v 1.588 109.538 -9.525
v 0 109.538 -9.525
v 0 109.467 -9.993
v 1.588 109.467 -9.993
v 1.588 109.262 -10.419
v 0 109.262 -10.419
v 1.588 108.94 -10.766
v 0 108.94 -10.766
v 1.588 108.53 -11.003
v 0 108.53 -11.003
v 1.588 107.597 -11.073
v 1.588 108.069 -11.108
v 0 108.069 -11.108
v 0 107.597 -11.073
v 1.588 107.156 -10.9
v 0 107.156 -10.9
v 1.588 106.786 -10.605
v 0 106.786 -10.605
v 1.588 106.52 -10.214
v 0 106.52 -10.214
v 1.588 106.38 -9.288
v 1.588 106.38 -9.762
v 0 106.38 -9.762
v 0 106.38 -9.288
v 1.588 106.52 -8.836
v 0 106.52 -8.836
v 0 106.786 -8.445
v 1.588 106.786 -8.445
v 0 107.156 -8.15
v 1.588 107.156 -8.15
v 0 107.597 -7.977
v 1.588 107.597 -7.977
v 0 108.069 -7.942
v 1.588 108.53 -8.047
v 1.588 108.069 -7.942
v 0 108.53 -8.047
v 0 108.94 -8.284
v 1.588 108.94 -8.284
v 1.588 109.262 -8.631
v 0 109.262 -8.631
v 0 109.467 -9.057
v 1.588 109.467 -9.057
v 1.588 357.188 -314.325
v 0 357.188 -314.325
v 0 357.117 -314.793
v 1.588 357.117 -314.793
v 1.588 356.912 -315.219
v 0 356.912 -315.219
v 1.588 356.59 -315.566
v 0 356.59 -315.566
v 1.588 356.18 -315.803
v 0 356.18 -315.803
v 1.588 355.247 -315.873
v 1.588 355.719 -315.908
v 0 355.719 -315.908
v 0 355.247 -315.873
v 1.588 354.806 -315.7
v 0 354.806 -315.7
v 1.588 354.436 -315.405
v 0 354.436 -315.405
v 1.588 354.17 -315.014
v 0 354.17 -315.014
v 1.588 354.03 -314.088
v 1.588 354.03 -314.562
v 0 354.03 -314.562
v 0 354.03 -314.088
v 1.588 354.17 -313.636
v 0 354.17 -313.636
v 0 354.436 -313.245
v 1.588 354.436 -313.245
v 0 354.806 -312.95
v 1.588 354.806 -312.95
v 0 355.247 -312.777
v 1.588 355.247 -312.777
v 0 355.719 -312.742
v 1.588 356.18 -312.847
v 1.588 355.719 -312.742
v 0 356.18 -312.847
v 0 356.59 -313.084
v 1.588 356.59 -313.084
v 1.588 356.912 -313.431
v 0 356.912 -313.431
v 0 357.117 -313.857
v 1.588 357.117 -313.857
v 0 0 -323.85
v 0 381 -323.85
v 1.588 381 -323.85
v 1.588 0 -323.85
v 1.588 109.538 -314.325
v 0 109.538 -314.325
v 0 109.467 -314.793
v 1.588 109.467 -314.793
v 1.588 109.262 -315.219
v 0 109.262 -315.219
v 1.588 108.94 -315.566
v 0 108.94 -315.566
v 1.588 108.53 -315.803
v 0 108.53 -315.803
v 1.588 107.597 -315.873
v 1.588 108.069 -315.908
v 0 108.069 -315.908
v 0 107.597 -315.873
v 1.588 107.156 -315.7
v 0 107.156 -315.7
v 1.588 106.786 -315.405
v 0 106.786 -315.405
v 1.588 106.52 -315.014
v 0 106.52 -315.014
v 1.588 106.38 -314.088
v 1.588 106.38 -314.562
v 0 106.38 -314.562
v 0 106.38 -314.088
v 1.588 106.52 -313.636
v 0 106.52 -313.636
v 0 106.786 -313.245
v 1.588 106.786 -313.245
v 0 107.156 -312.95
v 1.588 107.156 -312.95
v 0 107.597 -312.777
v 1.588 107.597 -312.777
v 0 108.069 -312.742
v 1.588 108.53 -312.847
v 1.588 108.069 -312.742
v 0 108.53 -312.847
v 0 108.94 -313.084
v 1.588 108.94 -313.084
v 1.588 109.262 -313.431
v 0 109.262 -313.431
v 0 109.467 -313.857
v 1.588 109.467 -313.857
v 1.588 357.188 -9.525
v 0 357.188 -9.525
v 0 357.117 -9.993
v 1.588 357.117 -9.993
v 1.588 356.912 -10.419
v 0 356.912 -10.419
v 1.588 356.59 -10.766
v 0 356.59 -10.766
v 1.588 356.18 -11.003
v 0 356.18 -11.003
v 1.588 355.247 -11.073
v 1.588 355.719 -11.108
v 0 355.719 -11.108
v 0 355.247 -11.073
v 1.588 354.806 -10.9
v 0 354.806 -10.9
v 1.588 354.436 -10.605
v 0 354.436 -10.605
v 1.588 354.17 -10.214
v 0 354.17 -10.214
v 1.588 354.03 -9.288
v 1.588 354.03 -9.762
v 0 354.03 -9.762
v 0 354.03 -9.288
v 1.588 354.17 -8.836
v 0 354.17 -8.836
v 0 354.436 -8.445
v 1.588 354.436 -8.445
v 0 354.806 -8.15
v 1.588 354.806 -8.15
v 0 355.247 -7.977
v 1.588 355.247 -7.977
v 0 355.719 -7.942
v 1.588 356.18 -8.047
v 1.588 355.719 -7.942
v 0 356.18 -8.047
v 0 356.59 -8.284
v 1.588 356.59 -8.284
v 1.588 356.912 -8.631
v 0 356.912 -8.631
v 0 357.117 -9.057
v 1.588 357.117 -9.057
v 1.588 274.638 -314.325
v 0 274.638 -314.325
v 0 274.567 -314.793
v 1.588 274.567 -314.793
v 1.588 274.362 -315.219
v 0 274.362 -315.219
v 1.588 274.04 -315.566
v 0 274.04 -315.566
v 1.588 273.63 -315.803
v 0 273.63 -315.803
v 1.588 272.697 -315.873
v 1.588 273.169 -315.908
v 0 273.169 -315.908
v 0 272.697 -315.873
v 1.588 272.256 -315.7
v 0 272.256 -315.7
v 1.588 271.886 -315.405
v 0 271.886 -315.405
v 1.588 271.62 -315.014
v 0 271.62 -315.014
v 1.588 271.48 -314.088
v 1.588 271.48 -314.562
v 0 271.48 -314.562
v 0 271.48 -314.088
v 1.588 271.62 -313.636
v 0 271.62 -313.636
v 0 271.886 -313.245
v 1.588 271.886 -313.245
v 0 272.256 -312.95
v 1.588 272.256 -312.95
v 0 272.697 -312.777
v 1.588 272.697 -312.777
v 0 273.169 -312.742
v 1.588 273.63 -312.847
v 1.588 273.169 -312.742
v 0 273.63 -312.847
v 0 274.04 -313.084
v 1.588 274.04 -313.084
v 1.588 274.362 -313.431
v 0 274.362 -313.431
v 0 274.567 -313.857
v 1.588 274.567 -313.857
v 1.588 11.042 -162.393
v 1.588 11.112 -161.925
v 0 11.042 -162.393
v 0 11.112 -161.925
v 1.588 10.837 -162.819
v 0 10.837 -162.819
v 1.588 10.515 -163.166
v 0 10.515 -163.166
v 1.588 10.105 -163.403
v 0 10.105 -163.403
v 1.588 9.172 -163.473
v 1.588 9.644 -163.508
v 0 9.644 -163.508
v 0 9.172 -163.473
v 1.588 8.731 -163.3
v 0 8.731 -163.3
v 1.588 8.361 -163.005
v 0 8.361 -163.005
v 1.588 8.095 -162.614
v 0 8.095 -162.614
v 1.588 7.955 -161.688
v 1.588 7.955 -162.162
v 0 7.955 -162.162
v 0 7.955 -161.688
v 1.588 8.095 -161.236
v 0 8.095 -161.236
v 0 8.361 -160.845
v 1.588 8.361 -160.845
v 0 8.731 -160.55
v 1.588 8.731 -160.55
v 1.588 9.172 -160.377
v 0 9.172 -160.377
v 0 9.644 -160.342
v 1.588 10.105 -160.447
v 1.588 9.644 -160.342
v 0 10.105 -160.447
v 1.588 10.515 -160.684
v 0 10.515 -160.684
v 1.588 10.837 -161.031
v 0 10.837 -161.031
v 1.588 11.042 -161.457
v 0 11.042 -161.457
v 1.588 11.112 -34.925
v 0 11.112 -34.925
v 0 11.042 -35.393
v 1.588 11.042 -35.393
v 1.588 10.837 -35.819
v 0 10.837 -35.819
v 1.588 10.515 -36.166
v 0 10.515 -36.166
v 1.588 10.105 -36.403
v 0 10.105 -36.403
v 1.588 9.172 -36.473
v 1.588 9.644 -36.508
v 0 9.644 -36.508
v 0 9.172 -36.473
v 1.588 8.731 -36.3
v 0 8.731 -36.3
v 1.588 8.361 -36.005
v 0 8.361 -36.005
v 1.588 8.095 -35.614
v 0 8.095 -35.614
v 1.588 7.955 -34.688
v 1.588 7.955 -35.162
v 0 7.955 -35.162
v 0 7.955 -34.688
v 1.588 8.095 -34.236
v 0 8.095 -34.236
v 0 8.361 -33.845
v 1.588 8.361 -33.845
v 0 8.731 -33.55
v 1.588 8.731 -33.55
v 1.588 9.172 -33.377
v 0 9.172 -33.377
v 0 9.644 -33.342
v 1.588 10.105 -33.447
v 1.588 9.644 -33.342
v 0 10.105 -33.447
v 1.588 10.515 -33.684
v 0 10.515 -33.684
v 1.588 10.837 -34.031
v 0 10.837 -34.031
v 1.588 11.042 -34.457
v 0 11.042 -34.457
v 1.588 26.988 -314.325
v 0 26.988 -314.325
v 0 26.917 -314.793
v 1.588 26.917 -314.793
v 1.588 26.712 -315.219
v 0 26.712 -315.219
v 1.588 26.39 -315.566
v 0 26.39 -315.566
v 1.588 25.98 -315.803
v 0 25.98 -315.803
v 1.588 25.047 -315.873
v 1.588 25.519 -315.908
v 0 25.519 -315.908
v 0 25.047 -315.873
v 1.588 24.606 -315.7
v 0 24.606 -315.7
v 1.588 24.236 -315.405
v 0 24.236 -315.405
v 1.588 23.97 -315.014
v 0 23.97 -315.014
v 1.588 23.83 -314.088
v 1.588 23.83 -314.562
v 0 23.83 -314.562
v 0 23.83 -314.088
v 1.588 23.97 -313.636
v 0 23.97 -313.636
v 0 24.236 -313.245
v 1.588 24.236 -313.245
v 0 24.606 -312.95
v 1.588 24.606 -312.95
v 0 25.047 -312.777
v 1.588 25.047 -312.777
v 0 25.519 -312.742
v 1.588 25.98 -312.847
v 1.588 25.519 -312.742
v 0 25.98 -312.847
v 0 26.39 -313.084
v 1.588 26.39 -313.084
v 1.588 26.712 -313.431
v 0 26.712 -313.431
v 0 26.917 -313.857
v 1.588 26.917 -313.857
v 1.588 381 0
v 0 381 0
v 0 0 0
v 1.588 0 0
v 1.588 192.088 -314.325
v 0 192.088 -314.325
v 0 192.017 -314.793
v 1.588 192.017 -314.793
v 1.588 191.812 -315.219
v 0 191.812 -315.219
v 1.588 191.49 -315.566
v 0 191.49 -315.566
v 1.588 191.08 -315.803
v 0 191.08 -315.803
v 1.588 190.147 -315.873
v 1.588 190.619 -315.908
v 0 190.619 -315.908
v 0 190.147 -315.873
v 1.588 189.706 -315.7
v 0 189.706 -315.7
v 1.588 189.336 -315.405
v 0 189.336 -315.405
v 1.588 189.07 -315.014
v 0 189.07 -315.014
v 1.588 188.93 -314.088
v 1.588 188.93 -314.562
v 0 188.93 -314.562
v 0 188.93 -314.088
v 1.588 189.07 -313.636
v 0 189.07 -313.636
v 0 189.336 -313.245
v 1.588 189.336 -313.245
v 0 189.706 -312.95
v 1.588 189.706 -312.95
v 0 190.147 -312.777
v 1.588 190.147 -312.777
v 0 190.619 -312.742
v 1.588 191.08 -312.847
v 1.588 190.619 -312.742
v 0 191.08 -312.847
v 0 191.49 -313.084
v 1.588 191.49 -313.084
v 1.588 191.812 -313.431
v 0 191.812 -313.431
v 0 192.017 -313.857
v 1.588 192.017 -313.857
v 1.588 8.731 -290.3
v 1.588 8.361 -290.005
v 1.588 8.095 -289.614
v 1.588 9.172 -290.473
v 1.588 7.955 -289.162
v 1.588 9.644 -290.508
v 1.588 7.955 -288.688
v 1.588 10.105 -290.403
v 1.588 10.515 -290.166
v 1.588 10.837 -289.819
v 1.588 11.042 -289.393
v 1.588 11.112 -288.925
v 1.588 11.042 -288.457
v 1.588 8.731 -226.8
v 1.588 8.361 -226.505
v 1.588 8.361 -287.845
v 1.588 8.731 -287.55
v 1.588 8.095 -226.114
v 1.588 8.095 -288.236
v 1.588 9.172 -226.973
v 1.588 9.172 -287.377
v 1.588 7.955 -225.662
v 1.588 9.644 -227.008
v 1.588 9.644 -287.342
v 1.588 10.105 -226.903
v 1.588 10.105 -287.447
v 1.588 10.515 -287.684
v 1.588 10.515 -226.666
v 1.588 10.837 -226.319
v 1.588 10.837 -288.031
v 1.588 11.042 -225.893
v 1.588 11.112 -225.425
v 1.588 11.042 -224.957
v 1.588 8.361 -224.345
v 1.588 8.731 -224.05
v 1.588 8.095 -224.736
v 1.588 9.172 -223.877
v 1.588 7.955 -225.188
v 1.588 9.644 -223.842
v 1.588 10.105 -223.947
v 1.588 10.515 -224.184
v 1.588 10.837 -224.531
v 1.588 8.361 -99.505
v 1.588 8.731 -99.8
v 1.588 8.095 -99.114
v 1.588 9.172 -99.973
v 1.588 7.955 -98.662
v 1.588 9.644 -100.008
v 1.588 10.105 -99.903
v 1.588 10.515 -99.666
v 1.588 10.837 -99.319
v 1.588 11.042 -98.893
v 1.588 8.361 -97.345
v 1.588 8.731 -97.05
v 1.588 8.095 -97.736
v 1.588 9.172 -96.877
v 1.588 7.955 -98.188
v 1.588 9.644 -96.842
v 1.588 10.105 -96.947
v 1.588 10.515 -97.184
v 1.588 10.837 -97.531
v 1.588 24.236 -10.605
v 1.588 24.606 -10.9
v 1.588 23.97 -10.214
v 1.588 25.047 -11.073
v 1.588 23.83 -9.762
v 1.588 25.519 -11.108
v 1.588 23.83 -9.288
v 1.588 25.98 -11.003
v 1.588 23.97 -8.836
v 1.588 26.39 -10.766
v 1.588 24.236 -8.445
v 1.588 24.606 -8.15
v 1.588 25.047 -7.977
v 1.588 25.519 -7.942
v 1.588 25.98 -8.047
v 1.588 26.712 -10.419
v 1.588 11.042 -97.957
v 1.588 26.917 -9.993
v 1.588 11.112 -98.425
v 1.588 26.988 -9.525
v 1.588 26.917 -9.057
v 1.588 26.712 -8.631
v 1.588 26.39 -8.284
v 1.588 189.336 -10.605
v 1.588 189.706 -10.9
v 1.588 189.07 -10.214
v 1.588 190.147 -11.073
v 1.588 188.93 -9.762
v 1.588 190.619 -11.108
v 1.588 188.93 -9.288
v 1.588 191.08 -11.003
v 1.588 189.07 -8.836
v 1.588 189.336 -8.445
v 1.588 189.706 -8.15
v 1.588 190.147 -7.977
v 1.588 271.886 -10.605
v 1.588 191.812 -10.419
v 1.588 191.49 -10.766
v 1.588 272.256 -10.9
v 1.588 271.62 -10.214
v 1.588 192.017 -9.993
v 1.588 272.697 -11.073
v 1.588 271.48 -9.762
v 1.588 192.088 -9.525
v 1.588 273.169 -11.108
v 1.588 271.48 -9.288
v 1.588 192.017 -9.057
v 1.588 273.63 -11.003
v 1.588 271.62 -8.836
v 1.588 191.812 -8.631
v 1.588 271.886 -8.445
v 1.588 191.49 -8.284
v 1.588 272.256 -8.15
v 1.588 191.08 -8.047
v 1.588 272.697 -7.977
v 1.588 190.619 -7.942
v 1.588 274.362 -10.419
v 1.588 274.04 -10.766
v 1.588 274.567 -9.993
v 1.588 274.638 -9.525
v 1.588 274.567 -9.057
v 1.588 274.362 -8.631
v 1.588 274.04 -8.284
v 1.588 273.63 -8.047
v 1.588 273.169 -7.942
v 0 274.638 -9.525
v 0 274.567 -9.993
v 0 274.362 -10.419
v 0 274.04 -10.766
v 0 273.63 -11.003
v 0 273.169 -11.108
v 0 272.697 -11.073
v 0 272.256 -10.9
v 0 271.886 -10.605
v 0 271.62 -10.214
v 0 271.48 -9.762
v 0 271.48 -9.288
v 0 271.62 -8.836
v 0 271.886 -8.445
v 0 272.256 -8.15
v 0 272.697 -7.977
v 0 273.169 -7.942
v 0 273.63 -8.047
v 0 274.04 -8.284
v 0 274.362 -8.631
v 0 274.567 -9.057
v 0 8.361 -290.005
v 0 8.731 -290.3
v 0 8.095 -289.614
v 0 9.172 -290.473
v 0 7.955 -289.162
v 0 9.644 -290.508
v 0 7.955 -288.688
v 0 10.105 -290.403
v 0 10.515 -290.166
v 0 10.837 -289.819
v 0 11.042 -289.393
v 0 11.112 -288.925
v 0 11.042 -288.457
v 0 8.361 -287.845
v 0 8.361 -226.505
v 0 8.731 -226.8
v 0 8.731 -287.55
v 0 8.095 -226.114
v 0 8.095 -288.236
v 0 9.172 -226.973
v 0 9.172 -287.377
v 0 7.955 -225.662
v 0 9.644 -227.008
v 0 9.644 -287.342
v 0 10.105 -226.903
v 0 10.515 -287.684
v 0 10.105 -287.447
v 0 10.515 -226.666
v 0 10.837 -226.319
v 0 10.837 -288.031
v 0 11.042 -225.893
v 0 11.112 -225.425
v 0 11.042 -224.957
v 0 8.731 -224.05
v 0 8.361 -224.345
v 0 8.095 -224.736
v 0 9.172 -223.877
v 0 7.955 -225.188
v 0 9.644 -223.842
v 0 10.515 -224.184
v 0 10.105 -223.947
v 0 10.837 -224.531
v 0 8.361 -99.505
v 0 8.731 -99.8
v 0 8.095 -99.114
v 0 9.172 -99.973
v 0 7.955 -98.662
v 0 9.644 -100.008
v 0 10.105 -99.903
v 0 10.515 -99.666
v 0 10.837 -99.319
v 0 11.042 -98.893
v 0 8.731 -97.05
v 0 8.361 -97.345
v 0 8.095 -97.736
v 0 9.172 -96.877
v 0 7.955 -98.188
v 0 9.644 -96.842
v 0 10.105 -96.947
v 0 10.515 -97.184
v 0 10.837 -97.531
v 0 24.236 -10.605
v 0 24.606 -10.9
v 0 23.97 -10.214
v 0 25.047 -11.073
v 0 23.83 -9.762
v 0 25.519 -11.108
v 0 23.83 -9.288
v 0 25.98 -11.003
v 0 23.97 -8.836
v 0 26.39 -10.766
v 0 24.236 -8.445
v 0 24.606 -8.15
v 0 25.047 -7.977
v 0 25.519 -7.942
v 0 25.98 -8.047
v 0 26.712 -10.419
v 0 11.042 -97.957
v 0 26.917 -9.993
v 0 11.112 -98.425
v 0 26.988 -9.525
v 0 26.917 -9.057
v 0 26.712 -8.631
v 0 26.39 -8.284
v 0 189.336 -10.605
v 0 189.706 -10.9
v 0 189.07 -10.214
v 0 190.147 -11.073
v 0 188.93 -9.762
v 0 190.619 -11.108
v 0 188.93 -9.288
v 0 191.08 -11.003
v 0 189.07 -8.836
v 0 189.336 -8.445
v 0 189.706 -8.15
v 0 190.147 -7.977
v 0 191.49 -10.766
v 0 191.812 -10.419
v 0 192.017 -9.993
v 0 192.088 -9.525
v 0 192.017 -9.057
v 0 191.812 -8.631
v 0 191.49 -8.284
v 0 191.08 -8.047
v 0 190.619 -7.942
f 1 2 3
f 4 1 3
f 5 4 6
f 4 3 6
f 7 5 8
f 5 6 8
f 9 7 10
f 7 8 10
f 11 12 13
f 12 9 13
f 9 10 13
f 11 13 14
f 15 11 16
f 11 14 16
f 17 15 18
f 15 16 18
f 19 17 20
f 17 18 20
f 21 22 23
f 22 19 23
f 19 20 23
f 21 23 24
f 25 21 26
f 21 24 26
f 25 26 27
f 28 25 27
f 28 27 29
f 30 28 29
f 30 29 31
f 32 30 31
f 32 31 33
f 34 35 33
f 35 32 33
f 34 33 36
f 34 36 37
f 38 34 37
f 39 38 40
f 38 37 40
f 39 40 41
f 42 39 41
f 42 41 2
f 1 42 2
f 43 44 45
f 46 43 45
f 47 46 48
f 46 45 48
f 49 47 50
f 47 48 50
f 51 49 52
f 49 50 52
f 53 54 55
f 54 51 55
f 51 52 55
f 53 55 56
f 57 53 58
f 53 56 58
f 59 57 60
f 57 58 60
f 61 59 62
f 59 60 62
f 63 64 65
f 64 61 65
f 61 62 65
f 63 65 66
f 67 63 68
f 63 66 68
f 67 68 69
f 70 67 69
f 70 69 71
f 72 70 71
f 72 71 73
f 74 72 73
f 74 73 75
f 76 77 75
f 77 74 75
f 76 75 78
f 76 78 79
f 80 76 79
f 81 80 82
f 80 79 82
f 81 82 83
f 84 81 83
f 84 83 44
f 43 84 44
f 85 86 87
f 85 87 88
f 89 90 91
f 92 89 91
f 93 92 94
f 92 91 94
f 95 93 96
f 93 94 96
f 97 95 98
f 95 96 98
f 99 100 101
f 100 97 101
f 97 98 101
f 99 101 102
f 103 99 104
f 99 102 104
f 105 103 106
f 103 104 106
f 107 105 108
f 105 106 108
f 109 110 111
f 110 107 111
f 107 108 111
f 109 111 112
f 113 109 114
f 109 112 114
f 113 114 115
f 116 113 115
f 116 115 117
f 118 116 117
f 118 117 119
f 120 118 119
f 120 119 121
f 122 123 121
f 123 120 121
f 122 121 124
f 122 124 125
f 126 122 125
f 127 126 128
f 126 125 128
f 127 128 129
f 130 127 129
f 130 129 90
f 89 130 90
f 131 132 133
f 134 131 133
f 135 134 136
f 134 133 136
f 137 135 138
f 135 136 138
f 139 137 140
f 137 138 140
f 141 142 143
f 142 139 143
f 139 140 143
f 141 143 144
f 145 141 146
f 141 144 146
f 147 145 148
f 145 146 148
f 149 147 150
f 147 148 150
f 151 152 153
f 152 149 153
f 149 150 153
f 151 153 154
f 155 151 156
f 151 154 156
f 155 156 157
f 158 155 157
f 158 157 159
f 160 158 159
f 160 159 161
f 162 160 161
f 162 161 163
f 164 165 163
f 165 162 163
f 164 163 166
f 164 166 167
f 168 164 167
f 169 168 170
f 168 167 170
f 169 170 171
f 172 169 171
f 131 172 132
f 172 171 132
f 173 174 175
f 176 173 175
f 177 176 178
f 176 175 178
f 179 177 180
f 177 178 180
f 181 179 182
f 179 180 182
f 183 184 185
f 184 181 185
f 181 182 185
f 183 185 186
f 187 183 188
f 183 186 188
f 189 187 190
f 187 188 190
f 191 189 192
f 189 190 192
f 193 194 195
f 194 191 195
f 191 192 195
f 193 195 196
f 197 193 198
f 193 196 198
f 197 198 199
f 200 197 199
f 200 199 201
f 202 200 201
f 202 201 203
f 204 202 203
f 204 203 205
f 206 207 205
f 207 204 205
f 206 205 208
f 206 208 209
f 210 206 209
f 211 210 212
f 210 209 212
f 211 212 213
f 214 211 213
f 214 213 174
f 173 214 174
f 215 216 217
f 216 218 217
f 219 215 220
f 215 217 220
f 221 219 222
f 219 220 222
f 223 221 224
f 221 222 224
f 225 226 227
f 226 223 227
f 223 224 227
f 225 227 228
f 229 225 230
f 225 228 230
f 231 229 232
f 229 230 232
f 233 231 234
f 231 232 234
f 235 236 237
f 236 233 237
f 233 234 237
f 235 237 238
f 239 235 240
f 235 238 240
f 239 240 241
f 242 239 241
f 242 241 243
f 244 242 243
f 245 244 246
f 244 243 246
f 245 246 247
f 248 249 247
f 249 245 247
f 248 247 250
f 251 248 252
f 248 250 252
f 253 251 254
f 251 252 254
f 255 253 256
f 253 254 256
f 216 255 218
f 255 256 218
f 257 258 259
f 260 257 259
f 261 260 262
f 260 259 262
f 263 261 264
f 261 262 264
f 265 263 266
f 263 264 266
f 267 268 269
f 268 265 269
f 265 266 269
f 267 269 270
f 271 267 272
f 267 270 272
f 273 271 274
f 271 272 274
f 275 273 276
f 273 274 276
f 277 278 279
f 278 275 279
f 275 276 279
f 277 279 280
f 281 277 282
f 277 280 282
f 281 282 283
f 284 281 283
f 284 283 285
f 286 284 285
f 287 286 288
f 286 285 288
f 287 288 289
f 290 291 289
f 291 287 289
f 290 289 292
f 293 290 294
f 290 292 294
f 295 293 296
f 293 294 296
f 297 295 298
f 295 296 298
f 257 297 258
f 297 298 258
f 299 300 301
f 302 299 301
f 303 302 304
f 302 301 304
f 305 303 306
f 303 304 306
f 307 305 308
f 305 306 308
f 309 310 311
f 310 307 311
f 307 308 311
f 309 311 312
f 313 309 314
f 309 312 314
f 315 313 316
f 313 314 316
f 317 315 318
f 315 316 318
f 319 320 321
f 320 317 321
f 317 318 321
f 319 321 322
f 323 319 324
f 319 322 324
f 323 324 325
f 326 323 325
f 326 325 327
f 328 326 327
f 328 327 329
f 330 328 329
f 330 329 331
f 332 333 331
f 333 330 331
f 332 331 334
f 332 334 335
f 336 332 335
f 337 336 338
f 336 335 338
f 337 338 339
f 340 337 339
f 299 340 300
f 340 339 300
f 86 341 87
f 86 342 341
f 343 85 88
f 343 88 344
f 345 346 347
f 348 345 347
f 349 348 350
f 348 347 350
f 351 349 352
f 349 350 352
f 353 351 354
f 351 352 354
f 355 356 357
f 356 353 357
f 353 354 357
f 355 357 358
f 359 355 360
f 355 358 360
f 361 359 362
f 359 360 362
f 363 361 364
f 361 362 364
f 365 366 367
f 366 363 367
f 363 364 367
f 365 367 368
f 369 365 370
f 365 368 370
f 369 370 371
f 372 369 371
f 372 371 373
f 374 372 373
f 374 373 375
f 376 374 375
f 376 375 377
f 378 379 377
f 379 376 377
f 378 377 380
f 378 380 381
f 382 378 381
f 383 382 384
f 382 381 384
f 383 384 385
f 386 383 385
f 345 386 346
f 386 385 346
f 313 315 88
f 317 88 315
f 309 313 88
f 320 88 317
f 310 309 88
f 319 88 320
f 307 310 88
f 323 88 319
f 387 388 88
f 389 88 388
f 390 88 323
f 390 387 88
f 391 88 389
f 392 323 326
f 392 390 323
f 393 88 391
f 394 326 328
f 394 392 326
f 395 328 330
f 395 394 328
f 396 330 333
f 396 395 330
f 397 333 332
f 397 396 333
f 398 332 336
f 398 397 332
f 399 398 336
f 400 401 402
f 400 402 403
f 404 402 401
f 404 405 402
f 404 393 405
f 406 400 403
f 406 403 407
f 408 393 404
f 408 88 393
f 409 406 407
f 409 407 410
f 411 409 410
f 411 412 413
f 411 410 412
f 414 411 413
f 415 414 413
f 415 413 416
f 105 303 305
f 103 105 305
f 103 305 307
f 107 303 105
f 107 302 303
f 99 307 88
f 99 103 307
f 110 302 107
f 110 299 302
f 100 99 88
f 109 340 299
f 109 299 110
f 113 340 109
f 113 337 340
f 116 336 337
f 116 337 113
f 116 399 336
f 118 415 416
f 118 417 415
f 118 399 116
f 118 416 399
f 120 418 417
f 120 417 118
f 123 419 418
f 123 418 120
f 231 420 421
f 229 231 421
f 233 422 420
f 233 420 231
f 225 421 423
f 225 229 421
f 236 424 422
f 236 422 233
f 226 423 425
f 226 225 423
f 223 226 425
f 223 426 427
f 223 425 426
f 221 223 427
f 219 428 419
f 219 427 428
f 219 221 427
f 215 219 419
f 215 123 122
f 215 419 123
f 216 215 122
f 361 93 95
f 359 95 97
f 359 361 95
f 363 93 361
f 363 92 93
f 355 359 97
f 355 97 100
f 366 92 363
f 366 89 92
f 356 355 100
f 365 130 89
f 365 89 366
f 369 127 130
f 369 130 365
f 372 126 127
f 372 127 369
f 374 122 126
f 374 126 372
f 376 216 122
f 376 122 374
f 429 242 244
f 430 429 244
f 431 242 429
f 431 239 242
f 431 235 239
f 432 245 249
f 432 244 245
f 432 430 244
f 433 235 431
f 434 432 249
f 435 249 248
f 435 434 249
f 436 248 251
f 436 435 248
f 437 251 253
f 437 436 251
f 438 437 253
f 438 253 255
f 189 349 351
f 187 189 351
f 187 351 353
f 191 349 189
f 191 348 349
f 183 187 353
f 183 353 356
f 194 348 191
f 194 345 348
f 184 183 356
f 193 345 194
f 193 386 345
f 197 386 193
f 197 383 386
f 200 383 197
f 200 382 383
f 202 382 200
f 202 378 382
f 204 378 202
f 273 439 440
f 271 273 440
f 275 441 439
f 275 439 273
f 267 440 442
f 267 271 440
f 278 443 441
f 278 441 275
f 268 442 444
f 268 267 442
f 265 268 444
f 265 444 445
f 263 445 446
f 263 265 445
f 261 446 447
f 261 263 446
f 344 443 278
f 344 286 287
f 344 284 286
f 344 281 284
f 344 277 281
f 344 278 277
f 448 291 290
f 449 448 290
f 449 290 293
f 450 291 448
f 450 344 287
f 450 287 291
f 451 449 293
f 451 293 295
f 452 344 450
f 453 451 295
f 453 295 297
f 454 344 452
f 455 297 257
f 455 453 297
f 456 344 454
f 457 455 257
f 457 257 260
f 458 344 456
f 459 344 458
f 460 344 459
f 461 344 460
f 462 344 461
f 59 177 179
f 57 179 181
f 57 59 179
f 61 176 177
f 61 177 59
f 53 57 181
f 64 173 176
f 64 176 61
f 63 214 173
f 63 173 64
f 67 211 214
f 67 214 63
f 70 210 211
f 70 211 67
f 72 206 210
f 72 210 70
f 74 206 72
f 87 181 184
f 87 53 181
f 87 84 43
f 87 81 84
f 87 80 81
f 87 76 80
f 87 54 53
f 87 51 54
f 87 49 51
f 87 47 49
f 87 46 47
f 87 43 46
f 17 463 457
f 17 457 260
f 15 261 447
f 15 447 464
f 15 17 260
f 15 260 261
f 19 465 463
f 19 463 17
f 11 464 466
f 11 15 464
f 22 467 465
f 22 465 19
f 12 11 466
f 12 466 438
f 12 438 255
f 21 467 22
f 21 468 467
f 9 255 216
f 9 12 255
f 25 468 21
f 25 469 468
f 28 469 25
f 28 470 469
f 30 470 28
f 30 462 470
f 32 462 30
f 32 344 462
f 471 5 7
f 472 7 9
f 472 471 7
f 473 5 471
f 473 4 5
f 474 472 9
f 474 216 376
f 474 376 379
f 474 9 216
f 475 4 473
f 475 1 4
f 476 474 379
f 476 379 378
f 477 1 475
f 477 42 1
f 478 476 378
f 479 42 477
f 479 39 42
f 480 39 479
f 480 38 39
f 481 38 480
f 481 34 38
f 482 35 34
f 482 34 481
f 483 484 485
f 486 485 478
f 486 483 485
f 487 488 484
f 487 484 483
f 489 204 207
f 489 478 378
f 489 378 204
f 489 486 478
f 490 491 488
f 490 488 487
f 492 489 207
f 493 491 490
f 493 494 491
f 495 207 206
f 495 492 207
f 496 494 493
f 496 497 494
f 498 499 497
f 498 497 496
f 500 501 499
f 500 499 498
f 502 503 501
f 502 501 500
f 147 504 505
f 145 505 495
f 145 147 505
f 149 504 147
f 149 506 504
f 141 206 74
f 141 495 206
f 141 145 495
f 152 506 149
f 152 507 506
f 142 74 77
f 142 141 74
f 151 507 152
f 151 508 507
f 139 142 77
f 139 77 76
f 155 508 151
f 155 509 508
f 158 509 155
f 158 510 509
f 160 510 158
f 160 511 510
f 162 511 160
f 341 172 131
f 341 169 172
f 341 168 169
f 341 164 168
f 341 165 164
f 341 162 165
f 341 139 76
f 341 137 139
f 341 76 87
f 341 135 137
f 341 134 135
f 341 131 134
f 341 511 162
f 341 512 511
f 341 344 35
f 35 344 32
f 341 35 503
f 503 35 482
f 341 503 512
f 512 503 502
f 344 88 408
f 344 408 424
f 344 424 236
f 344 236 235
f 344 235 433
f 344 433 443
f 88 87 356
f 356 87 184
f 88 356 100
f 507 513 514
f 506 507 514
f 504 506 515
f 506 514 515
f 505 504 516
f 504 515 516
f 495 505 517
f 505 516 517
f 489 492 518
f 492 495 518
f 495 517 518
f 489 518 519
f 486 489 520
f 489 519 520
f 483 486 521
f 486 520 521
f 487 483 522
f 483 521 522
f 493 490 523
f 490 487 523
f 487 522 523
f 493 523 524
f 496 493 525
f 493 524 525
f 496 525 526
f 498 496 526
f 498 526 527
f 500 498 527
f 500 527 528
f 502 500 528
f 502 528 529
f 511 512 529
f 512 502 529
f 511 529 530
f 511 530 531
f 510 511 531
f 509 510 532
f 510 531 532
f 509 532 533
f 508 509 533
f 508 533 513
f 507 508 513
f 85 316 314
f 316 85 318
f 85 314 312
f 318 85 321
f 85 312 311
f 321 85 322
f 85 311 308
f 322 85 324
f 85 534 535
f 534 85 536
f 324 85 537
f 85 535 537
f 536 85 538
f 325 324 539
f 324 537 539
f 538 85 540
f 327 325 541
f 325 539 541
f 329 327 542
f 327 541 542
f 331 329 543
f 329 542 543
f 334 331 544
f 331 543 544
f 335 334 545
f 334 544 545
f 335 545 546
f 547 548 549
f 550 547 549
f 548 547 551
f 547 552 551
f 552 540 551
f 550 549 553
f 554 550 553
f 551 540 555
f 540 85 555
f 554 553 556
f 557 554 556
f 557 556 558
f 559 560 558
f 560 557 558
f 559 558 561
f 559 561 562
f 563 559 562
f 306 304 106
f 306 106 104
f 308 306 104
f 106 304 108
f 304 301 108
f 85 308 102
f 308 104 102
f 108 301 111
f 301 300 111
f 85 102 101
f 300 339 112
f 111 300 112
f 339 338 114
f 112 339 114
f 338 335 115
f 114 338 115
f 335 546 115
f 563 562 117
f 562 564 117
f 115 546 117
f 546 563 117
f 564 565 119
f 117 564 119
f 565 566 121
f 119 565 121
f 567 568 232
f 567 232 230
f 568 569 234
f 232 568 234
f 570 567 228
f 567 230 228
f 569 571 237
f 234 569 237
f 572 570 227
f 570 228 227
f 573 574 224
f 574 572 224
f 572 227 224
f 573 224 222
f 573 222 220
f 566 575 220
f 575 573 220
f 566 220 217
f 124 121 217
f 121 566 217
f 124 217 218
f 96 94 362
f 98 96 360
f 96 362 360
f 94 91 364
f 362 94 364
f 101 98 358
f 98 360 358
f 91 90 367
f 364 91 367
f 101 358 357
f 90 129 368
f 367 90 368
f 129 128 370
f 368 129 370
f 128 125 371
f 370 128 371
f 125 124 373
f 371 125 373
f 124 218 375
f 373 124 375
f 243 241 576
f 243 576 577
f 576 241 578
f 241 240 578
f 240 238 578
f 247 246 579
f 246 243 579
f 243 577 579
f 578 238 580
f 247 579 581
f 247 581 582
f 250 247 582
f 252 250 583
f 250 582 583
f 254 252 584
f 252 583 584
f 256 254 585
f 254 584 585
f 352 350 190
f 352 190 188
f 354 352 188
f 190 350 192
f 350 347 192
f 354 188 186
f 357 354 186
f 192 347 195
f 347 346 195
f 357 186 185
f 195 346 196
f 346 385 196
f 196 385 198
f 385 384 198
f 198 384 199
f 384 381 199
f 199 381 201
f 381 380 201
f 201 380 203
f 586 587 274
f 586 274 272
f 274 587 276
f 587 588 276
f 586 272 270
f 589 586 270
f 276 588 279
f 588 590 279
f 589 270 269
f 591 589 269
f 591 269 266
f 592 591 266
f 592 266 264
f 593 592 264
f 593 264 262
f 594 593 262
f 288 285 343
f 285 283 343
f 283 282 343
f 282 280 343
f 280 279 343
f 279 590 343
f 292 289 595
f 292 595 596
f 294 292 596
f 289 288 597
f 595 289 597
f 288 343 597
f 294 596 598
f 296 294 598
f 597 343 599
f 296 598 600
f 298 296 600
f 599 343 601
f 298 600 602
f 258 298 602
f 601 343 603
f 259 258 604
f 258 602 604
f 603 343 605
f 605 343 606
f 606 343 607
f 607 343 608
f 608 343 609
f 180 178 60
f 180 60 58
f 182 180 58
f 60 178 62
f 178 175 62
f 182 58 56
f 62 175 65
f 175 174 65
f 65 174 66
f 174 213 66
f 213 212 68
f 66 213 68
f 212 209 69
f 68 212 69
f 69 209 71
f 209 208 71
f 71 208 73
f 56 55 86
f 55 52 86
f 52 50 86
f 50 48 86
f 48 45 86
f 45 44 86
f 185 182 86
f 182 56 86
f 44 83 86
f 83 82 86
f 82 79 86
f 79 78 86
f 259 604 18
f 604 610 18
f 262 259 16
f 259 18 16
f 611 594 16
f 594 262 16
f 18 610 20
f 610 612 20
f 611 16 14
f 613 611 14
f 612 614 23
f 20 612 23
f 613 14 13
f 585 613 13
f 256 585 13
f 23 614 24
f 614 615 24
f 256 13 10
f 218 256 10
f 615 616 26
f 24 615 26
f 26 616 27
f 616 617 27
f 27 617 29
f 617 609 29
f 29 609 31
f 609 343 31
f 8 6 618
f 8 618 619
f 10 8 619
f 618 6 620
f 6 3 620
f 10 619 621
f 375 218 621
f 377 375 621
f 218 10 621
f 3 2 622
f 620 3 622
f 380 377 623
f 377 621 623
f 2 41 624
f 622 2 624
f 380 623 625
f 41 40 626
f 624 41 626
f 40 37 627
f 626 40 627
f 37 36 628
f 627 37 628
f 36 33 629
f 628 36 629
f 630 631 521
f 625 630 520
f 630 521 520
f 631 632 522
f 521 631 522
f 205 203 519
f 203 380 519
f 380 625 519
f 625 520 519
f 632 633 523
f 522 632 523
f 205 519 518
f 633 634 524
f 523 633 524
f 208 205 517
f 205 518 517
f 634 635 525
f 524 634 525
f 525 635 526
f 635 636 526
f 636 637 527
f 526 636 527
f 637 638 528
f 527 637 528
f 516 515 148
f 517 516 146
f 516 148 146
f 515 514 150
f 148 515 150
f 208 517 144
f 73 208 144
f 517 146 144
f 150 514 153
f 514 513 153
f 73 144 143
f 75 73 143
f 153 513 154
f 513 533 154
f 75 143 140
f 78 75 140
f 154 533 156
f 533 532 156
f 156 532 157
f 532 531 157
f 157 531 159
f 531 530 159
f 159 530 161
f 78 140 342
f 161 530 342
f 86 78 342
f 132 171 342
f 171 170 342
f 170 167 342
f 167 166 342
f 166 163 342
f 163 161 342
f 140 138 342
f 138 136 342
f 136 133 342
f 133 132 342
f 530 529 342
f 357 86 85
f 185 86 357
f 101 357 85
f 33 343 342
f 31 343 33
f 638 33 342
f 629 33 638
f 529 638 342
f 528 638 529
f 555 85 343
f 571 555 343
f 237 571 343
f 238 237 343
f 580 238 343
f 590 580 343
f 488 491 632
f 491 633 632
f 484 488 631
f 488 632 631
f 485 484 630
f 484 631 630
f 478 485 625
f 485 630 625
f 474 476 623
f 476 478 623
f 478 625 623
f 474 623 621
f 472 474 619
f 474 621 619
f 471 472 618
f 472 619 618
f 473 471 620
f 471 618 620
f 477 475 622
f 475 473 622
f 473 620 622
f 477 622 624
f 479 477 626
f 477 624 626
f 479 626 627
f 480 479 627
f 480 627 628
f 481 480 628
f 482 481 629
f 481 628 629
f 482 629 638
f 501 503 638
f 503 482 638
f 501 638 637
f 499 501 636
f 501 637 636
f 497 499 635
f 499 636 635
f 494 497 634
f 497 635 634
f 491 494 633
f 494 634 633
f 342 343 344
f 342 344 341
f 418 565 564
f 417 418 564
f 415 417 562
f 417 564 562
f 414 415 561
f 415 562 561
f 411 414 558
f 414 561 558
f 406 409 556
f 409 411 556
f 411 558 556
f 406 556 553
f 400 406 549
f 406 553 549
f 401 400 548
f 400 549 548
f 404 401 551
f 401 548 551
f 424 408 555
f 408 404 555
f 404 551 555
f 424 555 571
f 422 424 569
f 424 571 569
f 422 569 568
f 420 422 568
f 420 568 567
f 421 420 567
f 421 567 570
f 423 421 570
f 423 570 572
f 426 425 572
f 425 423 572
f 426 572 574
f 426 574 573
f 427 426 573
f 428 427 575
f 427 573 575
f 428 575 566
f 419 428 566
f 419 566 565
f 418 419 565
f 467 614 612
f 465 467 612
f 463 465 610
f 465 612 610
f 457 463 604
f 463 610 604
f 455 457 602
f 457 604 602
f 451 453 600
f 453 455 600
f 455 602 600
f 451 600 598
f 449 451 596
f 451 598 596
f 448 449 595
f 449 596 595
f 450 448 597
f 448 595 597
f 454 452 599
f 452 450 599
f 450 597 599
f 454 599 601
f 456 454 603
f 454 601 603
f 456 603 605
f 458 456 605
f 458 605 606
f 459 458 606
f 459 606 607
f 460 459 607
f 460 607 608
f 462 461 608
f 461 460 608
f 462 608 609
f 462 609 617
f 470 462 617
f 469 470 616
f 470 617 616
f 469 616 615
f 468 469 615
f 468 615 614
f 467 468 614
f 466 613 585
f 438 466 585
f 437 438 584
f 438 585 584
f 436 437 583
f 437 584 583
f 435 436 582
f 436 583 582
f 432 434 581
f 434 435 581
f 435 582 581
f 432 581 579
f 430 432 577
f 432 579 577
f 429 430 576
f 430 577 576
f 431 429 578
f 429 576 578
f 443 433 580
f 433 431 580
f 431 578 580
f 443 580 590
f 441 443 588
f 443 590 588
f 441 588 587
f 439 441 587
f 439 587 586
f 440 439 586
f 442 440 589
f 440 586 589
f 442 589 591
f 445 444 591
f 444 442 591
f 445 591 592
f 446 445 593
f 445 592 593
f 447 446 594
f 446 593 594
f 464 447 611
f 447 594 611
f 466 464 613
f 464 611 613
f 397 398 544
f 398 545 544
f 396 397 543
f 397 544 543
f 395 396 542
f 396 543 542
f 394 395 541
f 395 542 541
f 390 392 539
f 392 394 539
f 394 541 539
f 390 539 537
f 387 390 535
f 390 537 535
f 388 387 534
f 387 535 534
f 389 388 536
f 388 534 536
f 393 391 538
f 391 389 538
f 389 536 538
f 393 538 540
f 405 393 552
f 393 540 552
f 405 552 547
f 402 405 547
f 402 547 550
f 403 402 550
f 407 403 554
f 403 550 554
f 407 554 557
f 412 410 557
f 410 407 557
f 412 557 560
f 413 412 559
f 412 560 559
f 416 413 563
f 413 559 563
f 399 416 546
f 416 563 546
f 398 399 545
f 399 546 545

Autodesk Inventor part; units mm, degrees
ref_plane "YZ Plane" through (0, 0, 0) normal (1, 0, 0) x (0, 1, 0)
ref_plane "XZ Plane" through (0, 0, 0) normal (0, 1, 0) x (-1, 0, 0)
ref_plane "XY Plane" through (0, 0, 0) normal (0, 0, 1) x (1, 0, 0)
sketch "Sketch1" plane through (0, 0, 0) normal (1, 0, 0) x (0, 1, 0)
  line L0 (0, 0) -> (381, 0)
  line L1 (381, 0) -> (381, -323.85)
  line L2 (381, -323.85) -> (0, -323.85)
  line L3 (0, -323.85) -> (0, 0)
  line L4 (0, -314.325) -> (381, -314.325) construction
  line L5 (381, -161.925) -> (0, -161.925) construction
  line L6 (190.5, -323.85) -> (190.5, 0) construction
  line L7 (9.525, -323.85) -> (9.525, 0) construction
  circle A0 centre (9.525, -161.925) radius 1.5875
  circle A1 centre (9.525, -98.425) radius 1.5875
  circle A2 centre (9.525, -34.925) radius 1.5875
  circle A3 centre (9.525, -225.425) radius 1.5875
  circle A4 centre (9.525, -161.925) radius 1.5875
  circle A5 centre (9.525, -98.425) radius 1.5875
  circle A6 centre (9.525, -288.925) radius 1.5875
  circle A7 centre (9.525, -225.425) radius 1.5875
  circle A8 centre (9.525, -161.925) radius 1.5875
  circle A9 centre (190.5, -314.325) radius 1.5875
  circle A10 centre (273.05, -314.325) radius 1.5875
  circle A11 centre (355.6, -314.325) radius 1.5875
  circle A12 centre (107.95, -314.325) radius 1.5875
  circle A13 centre (25.4, -314.325) radius 1.5875
  line L8 (0, -9.525) -> (381, -9.525) construction
  circle A14 centre (190.5, -9.525) radius 1.5875
  circle A15 centre (273.05, -9.525) radius 1.5875
  circle A16 centre (355.6, -9.525) radius 1.5875
  circle A17 centre (107.95, -9.525) radius 1.5875
  circle A18 centre (25.4, -9.525) radius 1.5875
  dimension "d0" = 323.85
  dimension "d1" = 381
  dimension "d12" = 9.525
  dimension "d13" = 9.525
  dimension "d16" = 63.5
  dimension "d19" = 63.5
  dimension "d22" = 3.175
  dimension "d25" = 82.55
  dimension "d32" = 82.55
extrude "Extrusion1" add sketch "Sketch1" along normal blind 1.5875
equation "\"d13\" = d12"
properties part number "Short Wall" material "Polycarbonate, Clear"
